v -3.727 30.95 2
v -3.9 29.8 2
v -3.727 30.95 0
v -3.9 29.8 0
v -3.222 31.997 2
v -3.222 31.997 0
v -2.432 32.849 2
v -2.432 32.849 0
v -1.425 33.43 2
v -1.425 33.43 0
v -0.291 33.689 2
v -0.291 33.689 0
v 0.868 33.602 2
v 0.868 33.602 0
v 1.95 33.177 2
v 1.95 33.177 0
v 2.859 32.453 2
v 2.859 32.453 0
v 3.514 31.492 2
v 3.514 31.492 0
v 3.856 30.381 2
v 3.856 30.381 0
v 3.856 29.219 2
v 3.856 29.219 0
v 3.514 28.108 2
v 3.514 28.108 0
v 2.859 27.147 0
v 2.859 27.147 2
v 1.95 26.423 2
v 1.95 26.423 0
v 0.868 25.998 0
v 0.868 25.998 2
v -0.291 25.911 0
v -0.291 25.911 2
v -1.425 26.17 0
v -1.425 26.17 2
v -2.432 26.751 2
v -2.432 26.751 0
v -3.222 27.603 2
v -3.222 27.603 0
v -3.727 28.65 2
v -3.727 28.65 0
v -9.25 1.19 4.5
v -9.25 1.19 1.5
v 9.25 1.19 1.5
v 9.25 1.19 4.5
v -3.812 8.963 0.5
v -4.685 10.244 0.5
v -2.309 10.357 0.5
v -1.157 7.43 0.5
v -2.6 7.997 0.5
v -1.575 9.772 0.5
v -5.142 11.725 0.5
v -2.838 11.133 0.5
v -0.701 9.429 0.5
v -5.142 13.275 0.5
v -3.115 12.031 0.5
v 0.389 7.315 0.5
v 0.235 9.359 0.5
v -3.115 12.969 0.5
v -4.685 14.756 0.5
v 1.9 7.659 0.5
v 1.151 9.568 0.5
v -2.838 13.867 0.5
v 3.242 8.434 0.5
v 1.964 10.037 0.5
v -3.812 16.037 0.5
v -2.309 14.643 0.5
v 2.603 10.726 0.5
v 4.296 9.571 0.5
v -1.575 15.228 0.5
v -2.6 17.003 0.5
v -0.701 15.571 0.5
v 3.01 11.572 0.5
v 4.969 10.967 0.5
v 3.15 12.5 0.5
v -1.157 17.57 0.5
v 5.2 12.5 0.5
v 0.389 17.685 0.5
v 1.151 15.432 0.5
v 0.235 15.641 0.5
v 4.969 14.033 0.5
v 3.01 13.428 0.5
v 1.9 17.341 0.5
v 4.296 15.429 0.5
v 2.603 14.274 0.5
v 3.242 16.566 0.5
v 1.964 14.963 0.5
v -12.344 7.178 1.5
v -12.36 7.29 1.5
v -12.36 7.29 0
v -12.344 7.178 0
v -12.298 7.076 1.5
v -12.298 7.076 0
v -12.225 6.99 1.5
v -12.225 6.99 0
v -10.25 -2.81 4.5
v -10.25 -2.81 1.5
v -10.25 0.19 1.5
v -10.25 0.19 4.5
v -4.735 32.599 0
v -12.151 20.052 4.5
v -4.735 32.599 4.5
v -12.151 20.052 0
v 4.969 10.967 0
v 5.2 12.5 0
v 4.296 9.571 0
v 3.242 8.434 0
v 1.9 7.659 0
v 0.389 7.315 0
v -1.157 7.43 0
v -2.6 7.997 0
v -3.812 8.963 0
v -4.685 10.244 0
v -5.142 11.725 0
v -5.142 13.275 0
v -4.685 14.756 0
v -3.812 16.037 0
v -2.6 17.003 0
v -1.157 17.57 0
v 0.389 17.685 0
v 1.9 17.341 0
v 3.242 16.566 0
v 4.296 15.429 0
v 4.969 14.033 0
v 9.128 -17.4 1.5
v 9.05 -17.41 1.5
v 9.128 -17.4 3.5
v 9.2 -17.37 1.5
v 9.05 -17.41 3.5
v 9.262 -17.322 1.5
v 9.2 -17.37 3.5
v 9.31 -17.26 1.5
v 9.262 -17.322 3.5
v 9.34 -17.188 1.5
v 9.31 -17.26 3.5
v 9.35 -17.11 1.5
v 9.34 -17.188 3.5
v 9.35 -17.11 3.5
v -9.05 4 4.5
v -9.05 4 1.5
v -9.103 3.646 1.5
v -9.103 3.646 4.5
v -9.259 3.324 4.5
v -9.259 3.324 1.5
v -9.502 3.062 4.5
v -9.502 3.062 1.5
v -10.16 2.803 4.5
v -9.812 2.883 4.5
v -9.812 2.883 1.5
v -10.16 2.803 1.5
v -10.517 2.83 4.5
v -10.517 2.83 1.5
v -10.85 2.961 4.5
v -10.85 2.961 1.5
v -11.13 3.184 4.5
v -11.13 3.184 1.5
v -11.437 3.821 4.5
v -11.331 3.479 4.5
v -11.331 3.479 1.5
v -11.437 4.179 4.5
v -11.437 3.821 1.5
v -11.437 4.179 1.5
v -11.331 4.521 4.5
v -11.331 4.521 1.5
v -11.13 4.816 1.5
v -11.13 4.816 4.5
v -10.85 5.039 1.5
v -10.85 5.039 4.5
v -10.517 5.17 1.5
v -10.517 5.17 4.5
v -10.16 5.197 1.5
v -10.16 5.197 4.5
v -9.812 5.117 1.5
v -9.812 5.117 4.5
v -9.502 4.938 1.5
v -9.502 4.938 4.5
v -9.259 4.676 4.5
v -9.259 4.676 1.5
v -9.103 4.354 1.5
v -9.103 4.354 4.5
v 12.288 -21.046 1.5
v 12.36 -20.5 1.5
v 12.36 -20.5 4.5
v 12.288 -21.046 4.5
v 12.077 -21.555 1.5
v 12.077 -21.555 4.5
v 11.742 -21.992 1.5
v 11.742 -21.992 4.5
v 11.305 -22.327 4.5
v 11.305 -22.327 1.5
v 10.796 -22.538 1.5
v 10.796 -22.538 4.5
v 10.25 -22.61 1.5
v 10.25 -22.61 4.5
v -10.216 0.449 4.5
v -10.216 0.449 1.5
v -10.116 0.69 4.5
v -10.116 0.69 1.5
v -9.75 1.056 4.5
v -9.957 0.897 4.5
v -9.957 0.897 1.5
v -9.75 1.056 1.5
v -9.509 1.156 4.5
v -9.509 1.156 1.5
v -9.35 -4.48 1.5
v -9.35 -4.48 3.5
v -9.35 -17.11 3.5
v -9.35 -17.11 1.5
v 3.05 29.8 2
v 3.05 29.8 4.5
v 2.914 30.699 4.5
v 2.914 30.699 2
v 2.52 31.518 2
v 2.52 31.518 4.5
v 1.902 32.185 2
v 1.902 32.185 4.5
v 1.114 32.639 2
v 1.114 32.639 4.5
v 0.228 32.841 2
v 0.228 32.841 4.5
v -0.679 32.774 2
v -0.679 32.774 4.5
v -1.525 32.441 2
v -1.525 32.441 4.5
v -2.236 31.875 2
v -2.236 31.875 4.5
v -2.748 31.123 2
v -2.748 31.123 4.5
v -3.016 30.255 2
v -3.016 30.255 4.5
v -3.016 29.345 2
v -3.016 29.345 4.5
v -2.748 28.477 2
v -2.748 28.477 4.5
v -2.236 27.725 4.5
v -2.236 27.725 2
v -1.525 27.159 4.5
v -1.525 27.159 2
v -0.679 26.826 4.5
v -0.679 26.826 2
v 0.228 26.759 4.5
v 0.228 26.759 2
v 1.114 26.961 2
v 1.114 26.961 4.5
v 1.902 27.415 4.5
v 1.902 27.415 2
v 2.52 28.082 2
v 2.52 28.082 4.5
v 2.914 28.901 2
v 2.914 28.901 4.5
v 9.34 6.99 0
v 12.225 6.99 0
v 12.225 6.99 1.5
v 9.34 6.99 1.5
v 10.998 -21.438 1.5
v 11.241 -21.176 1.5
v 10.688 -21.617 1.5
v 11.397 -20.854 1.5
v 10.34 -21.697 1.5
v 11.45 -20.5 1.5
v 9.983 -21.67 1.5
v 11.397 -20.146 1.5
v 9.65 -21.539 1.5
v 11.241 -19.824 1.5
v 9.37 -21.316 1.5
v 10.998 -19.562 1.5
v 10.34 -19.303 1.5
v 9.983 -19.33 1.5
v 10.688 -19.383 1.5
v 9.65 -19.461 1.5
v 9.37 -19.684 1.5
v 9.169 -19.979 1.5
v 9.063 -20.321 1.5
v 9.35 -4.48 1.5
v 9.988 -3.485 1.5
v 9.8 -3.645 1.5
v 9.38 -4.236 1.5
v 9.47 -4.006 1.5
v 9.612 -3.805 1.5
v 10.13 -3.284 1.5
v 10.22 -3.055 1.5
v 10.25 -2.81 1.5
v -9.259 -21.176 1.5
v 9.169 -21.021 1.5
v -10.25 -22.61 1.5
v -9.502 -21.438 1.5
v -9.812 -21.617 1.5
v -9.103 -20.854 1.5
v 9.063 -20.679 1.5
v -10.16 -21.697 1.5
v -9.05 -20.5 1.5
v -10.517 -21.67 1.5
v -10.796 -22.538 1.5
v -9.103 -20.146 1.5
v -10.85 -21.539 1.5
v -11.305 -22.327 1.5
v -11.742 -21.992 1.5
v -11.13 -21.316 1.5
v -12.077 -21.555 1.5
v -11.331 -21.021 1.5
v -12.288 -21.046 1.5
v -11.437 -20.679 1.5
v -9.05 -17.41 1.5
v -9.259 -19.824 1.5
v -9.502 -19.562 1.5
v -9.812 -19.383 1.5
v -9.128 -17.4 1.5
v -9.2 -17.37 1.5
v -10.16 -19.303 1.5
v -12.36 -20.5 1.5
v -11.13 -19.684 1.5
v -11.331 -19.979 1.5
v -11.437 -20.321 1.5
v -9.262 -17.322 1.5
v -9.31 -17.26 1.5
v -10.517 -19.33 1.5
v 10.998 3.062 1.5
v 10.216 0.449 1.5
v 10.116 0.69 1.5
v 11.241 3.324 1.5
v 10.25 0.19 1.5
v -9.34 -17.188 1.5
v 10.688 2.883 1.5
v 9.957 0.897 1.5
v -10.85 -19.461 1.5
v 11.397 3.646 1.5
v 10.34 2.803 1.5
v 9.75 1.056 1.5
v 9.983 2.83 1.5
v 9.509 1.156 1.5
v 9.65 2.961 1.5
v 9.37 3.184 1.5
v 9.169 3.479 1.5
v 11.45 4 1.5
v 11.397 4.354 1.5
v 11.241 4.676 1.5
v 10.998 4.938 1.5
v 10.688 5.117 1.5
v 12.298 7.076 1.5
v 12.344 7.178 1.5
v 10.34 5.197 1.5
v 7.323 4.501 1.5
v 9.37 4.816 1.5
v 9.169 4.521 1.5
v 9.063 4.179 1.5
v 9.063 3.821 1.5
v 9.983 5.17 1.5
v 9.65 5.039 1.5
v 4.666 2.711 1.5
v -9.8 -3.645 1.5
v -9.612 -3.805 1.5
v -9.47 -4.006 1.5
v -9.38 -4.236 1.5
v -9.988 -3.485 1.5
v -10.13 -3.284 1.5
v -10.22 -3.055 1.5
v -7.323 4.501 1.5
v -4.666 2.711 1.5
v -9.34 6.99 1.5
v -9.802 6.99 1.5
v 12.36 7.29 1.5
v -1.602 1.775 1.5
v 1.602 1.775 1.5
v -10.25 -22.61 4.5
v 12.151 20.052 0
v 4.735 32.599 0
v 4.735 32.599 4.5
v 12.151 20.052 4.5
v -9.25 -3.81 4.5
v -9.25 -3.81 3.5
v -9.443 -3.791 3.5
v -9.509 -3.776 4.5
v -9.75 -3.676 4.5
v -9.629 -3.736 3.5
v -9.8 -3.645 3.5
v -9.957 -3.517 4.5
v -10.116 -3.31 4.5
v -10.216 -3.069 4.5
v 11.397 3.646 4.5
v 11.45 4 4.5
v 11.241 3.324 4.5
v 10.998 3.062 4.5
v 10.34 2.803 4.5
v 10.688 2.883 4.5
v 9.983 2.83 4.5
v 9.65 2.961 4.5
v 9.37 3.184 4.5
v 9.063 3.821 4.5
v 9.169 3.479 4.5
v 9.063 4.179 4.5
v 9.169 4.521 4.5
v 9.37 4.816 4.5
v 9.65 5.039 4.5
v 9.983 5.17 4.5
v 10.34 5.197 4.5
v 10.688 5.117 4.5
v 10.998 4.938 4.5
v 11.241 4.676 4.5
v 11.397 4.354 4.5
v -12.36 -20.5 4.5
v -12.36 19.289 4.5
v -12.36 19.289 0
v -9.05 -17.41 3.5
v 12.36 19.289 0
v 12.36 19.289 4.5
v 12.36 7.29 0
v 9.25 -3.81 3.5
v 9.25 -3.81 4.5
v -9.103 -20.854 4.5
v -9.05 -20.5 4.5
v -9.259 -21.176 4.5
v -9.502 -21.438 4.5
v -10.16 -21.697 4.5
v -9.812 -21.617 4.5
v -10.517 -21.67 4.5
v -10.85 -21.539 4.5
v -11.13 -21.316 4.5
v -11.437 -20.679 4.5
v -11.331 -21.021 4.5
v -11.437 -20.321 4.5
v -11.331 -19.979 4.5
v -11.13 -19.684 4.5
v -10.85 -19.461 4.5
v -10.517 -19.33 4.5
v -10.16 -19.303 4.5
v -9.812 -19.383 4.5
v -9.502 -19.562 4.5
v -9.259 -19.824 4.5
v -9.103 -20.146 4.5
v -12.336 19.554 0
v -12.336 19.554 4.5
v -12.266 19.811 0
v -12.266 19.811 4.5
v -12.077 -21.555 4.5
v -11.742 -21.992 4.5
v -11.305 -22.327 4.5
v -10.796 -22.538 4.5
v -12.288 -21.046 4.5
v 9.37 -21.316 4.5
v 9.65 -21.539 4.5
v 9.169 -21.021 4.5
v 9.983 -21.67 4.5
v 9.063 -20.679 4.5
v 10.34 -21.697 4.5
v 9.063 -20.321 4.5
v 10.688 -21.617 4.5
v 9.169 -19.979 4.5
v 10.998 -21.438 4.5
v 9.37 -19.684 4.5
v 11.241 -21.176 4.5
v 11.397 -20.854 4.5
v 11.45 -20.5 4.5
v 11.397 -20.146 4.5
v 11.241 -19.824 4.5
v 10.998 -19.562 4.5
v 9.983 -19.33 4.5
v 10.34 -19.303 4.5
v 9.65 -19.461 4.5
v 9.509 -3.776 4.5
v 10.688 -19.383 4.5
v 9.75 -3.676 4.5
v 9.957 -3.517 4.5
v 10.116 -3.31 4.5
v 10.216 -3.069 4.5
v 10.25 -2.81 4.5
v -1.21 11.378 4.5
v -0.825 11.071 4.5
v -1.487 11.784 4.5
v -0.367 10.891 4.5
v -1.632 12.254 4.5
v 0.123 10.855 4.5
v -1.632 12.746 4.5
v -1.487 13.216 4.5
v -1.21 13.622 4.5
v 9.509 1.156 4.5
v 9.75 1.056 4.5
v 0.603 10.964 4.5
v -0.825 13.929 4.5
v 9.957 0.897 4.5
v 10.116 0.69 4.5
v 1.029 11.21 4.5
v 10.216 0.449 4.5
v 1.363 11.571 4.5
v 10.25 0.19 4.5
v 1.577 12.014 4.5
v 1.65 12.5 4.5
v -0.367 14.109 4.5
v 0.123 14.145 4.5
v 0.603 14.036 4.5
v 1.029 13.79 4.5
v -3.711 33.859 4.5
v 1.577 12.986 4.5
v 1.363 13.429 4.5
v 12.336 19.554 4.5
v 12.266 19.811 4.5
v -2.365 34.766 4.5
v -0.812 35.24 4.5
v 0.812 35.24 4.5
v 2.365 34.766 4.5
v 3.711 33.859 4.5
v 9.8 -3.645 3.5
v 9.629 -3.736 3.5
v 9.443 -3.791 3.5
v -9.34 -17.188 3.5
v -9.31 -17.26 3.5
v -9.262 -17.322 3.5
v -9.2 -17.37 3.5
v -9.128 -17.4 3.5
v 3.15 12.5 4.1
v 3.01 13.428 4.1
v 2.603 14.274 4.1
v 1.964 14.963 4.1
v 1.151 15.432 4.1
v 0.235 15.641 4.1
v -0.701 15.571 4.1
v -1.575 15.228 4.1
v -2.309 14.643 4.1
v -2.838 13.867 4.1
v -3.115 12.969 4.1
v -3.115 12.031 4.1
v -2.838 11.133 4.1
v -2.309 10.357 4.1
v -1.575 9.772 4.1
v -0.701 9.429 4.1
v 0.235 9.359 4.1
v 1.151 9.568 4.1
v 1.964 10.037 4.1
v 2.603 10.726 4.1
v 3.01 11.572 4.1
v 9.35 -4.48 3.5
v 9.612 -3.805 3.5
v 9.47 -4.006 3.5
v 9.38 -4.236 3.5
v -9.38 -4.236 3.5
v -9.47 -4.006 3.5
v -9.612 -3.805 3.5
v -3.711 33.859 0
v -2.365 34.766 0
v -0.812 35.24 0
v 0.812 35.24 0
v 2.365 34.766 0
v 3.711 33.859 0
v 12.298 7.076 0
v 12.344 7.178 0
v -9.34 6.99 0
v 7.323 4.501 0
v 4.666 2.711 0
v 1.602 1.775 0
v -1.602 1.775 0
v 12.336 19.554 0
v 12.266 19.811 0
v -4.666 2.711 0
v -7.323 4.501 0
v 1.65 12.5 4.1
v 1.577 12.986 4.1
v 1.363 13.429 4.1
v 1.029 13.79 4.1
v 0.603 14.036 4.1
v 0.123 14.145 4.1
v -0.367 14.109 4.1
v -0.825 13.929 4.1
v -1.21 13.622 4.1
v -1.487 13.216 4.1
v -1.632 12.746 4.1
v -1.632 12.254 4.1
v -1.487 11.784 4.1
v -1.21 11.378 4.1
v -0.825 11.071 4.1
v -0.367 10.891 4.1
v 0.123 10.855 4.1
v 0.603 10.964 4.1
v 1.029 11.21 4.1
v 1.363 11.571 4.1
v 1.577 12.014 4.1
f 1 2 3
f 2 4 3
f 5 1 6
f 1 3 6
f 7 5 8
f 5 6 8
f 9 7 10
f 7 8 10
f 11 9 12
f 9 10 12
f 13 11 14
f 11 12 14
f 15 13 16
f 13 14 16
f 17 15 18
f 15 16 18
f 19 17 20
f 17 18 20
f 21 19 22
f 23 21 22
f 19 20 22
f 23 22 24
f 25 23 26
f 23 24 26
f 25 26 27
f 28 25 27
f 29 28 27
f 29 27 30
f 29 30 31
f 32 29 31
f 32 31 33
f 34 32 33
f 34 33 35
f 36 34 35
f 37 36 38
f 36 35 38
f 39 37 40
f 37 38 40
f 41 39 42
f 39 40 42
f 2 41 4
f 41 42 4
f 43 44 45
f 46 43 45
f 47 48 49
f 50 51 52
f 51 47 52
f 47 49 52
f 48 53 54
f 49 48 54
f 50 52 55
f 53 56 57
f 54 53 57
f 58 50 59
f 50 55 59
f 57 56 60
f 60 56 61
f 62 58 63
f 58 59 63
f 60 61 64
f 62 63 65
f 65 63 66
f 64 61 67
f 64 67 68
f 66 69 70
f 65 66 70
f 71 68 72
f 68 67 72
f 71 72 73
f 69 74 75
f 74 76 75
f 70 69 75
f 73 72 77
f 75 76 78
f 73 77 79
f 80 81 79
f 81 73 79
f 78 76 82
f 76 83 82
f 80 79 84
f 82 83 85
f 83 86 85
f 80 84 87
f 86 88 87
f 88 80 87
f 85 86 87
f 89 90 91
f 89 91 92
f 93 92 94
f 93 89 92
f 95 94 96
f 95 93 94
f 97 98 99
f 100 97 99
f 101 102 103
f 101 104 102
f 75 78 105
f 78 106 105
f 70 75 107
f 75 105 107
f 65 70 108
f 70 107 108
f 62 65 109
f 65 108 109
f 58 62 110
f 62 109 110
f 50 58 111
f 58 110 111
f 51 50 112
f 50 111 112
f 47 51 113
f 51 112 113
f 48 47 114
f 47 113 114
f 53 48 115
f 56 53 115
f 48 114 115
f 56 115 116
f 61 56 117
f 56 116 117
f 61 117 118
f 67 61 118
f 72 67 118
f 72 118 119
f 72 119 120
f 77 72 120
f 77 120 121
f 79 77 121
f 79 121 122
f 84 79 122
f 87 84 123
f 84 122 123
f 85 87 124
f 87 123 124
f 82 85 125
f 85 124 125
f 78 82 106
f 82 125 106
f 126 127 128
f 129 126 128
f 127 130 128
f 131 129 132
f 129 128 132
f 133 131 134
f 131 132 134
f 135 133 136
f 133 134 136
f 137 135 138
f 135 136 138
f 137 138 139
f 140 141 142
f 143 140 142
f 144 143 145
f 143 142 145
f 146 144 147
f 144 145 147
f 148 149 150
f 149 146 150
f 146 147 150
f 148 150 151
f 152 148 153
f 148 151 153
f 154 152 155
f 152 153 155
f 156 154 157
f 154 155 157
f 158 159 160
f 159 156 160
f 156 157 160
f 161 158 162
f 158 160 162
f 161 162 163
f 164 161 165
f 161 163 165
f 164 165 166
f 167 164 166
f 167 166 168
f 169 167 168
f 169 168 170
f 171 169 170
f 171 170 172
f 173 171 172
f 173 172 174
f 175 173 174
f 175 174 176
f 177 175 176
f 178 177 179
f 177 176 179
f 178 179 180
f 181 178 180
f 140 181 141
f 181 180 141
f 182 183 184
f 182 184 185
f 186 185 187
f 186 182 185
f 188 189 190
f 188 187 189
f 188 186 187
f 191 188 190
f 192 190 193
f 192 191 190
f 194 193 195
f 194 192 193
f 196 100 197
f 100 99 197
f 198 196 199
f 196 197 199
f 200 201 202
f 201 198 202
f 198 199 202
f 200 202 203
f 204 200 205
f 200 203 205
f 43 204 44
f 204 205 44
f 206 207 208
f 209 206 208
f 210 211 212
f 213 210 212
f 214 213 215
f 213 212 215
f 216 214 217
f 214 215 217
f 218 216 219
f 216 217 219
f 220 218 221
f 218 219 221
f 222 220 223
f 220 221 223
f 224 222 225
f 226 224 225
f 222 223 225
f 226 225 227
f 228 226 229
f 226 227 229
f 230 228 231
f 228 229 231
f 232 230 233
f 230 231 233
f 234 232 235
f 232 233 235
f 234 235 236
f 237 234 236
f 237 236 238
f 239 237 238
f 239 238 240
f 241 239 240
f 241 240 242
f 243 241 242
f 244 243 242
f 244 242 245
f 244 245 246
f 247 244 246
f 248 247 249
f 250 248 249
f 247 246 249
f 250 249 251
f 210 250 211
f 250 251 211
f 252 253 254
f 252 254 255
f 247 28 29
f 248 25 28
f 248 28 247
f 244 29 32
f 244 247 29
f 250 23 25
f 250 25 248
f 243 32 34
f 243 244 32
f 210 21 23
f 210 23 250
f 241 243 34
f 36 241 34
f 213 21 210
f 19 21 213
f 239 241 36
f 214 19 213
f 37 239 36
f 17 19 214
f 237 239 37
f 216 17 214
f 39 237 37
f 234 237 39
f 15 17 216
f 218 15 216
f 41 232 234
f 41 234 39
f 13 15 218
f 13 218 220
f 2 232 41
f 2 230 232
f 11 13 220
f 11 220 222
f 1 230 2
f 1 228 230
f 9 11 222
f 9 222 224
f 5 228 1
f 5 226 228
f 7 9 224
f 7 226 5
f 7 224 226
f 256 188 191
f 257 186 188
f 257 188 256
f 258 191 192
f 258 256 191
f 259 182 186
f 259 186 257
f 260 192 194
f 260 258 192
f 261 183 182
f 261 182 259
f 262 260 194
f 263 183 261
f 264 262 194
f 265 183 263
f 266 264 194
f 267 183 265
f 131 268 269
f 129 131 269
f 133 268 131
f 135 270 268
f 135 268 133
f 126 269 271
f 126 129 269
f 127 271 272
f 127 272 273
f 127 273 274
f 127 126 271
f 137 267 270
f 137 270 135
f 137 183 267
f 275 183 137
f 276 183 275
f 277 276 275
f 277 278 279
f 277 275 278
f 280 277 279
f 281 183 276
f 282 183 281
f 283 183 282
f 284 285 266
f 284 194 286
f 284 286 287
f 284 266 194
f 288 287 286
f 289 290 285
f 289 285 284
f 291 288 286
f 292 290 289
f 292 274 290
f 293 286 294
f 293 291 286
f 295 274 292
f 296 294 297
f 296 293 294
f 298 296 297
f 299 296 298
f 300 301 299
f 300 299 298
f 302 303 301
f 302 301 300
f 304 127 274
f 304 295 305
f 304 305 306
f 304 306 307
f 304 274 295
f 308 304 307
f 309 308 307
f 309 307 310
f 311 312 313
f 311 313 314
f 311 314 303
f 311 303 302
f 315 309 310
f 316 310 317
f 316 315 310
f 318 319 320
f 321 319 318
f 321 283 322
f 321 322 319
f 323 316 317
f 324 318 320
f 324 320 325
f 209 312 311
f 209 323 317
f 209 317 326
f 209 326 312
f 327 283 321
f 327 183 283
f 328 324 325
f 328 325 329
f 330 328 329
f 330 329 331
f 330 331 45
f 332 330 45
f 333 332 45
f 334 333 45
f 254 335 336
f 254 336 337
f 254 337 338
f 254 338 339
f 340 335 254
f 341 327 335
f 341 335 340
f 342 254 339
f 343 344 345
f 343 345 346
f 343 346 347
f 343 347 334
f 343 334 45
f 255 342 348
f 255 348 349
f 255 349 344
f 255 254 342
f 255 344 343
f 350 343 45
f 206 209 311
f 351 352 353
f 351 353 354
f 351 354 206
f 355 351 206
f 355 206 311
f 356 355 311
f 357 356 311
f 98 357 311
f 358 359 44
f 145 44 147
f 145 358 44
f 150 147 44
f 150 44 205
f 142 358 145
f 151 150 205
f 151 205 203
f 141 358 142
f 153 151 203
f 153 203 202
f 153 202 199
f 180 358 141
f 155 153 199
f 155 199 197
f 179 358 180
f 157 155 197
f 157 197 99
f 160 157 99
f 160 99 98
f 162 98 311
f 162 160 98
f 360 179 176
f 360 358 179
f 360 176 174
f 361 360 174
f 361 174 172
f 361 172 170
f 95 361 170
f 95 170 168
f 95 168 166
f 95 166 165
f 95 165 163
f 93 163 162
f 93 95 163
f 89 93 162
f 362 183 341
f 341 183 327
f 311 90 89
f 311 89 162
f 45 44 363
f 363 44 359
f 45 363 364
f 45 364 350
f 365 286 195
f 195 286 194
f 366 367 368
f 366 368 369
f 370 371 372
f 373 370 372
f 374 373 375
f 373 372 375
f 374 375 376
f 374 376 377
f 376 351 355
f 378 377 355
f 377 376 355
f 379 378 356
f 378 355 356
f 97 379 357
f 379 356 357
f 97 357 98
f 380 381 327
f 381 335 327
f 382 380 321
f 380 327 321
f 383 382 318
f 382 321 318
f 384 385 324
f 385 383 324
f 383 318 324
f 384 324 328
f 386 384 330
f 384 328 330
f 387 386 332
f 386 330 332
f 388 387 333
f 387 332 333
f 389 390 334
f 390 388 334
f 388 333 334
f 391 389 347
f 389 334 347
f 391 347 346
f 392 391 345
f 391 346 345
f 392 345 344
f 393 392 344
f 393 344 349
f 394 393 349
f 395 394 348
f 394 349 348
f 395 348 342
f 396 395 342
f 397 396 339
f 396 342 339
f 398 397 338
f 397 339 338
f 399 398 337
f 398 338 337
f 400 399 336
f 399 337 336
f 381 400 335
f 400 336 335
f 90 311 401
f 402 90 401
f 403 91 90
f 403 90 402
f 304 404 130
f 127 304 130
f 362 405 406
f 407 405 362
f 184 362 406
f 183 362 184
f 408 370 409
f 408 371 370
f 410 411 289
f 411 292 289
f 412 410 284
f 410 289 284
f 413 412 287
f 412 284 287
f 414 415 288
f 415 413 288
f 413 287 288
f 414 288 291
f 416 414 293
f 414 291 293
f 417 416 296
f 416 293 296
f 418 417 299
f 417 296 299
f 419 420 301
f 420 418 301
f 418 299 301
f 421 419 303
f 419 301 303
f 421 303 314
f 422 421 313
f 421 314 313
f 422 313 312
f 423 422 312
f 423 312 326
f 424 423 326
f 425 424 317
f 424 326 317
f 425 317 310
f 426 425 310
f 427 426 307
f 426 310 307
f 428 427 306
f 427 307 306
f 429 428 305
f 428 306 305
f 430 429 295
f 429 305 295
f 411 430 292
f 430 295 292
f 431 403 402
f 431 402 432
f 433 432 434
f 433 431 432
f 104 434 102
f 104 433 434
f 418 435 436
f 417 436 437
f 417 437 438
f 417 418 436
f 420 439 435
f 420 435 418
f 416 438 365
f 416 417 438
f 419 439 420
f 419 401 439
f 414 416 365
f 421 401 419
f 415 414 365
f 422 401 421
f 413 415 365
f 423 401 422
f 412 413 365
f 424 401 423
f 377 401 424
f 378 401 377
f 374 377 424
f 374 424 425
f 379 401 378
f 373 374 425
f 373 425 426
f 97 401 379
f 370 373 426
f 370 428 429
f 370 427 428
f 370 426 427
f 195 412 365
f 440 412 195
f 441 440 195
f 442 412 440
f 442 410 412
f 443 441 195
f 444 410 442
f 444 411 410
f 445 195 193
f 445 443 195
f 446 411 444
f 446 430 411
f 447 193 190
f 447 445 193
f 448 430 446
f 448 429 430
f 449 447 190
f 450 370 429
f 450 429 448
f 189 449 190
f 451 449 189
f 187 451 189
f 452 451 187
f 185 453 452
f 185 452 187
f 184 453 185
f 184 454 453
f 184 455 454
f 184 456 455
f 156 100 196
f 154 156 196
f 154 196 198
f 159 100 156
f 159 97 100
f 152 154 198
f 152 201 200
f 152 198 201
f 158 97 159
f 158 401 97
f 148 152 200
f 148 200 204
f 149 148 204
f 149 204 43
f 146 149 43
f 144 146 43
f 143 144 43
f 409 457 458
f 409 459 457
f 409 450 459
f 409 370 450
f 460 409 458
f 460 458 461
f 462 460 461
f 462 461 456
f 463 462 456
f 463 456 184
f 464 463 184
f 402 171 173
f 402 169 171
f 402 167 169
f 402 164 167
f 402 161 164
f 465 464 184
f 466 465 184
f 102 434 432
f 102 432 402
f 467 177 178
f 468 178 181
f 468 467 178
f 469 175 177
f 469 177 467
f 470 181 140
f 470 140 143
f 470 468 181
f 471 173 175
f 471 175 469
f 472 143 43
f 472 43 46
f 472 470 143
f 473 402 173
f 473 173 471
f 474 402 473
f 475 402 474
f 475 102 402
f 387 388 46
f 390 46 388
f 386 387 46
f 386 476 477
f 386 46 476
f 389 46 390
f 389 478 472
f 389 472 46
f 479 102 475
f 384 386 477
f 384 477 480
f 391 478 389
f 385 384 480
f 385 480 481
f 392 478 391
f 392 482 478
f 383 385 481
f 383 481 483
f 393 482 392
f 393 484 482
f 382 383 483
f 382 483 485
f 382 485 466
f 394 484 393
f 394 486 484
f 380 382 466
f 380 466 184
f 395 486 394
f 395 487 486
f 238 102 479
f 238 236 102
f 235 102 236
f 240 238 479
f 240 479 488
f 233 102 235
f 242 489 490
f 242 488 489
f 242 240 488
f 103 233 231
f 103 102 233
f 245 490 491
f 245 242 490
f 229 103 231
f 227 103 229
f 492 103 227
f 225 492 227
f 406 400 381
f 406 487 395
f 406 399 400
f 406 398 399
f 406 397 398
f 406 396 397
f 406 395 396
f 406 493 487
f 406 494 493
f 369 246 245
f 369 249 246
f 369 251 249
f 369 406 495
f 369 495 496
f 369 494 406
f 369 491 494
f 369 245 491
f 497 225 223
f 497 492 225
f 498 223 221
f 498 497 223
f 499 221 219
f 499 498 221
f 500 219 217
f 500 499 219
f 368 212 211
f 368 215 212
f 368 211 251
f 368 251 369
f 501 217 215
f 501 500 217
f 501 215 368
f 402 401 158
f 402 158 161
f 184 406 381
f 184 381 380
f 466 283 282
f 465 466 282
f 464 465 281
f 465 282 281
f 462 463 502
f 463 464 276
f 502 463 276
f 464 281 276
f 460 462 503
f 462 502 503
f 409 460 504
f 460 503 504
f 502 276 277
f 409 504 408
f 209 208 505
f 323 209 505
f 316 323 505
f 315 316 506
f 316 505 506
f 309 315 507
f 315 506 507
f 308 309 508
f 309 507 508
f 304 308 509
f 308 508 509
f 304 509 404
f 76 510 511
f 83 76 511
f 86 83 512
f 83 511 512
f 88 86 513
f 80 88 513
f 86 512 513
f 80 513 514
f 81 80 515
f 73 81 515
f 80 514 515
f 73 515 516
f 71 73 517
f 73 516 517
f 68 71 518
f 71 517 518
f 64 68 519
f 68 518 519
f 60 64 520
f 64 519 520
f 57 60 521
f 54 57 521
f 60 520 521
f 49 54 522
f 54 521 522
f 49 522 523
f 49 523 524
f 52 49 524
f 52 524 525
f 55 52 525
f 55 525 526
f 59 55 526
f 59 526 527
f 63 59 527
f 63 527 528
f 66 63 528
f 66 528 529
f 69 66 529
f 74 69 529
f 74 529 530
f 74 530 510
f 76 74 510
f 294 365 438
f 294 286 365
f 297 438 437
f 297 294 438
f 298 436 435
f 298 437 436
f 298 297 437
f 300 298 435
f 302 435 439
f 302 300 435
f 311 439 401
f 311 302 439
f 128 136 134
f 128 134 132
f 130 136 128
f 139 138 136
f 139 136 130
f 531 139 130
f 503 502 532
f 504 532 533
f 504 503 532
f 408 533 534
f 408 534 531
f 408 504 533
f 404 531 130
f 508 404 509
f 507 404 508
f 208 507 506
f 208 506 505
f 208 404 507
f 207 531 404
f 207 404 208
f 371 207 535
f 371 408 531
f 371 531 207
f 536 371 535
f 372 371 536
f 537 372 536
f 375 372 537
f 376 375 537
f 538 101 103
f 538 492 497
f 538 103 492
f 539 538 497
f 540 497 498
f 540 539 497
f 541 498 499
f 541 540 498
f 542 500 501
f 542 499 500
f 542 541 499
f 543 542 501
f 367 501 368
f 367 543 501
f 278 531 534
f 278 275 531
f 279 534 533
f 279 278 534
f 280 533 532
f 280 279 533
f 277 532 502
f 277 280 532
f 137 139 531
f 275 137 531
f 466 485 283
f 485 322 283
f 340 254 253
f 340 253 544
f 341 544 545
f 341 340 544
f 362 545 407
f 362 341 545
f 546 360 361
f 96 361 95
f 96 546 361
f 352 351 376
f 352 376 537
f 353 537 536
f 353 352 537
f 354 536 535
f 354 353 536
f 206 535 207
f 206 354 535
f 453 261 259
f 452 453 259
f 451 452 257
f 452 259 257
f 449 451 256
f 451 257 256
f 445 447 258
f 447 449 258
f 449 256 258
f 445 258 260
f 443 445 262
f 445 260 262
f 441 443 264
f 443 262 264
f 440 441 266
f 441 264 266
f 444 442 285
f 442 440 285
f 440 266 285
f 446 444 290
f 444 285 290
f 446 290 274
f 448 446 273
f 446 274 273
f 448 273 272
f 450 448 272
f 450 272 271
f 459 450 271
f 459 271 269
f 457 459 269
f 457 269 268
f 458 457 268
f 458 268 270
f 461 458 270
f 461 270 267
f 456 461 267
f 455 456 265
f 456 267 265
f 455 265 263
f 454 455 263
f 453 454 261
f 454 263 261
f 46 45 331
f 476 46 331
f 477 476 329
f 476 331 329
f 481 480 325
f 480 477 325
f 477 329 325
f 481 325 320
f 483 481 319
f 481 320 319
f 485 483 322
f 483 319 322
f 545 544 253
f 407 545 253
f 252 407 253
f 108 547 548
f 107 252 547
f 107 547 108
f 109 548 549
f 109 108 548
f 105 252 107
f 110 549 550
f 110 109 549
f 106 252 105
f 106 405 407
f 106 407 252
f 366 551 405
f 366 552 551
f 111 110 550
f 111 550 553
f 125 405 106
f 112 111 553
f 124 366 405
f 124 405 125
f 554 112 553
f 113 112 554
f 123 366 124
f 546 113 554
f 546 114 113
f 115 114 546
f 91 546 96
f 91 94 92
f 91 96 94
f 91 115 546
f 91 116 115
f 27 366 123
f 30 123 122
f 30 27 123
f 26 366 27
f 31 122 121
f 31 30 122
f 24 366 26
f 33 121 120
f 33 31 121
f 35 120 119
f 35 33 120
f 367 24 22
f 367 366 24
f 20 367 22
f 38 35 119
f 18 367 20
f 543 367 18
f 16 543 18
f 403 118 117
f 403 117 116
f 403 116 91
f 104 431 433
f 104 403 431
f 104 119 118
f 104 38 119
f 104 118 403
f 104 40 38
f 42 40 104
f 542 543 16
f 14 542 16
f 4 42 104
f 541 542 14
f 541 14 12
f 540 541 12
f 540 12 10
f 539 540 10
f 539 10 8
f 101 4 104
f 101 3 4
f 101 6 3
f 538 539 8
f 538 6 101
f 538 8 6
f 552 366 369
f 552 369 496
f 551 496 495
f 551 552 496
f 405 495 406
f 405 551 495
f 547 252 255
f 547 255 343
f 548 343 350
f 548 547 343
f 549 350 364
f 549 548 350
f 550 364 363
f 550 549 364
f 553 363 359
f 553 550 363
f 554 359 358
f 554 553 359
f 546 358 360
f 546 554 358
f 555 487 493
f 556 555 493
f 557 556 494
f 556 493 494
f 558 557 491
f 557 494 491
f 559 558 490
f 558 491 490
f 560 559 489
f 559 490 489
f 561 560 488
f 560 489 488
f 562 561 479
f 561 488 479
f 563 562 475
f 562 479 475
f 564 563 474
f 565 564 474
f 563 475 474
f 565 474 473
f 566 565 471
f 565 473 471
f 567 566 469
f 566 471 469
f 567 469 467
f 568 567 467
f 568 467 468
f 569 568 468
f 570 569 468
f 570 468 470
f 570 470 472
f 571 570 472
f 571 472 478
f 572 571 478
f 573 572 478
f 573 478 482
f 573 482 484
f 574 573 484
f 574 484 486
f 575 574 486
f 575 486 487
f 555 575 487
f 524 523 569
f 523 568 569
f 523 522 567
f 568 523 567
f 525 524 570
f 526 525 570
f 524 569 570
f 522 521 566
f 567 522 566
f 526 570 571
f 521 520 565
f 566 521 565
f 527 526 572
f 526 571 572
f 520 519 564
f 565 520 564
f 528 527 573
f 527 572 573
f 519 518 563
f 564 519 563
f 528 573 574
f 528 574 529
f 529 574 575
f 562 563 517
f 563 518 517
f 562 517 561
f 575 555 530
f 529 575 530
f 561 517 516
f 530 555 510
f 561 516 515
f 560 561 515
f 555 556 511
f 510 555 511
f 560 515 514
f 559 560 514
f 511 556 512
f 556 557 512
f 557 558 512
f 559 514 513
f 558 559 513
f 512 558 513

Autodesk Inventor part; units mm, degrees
ref_plane "YZ Plane" through (0, 0, 0) normal (1, 0, 0) x (0, 1, 0)
ref_plane "XZ Plane" through (0, 0, 0) normal (0, 1, 0) x (-1, 0, 0)
ref_plane "XY Plane" through (0, 0, 0) normal (0, 0, 1) x (1, 0, 0)
sketch "スケッチ1" plane through (0, 0, 0) normal (0, 0, 1) x (1, 0, 0)
  circle A0 centre (0, 12.5) radius 5 construction
  line L0 (12.16, 19.2887) -> (12.16, 6.89) construction
  arc A1 (12.16, 19.2887) -> (11.7792, 20.2079) centre (10.86, 19.2887) ccw construction
  line L1 (9.9579, 22.0292) -> (11.7792, 20.2079) construction
  arc A2 (9.9579, 22.0292) -> (9.0387, 22.41) centre (9.0387, 21.11) ccw construction
  line L2 (0.95, 22.41) -> (9.0387, 22.41) construction
  line L3 (0.95, 19.61) -> (0.95, 22.41) construction
  arc A3 (-0.95, 19.61) -> (0.95, 19.61) centre (0, 19.61) ccw construction
  line L4 (-0.95, 22.41) -> (-0.95, 19.61) construction
  line L5 (-9.0387, 22.41) -> (-0.95, 22.41) construction
  arc A4 (-9.0387, 22.41) -> (-9.9579, 22.0292) centre (-9.0387, 21.11) ccw construction
  line L6 (-11.7792, 20.2079) -> (-9.9579, 22.0292) construction
  arc A5 (-11.7792, 20.2079) -> (-12.16, 19.2887) centre (-10.86, 19.2887) ccw construction
  line L7 (-12.16, 6.89) -> (-12.16, 19.2887) construction
  line L8 (-12.16, 6.89) -> (-9.9756, 6.89) construction
  arc A6 (-9.8028, 6.7907) -> (-9.9756, 6.89) centre (-9.9756, 6.69) ccw construction
  arc A7 (-9.8028, 6.7907) -> (-6.5643, 3.2479) centre (0, 12.5) ccw construction
  arc A8 (-6.48, 3.0847) -> (-6.5643, 3.2479) centre (-6.68, 3.0847) ccw construction
  line L9 (-6.48, 3.0847) -> (-6.48, 1.39) construction
  arc A9 (-6.68, 1.19) -> (-6.48, 1.39) centre (-6.68, 1.39) ccw construction
  line L10 (-6.68, 1.19) -> (6.68, 1.19) projected
  arc A10 (6.48, 1.39) -> (6.68, 1.19) centre (6.68, 1.39) ccw construction
  line L11 (6.48, 1.39) -> (6.48, 3.0847) construction
  arc A11 (6.5643, 3.2479) -> (6.48, 3.0847) centre (6.68, 3.0847) ccw construction
  arc A12 (6.5643, 3.2479) -> (9.8028, 6.7907) centre (0, 12.5) ccw construction
  arc A13 (9.9756, 6.89) -> (9.8028, 6.7907) centre (9.9756, 6.69) ccw construction
  line L12 (9.9756, 6.89) -> (12.16, 6.89) construction
  arc A14 (12.36, 19.2887) -> (12.1513, 20.052) centre (10.86, 19.2887) ccw projected
  arc A15 (-12.1513, 20.052) -> (-12.36, 19.2887) centre (-10.86, 19.2887) ccw projected
  line L13 (12.36, 19.2887) -> (12.36, -20.5) projected
  line L14 (-12.36, -20.5) -> (-12.36, 19.2887) projected
  line L15 (-12.36, 6.89) -> (-9.86, 6.89)
  line L16 (12.36, 6.89) -> (9.86, 6.89)
  arc A16 (-9.86, 6.89) -> (9.86, 6.89) centre (0, 12.5) ccw
  circle A17 centre (0, 12.5) radius 5.2
  arc A18 (4.7347, 32.5987) -> (-4.7347, 32.5987) centre (0, 29.8) ccw projected
  line L17 (-12.1513, 20.052) -> (-4.7347, 32.5987) projected
  circle A19 centre (0, 29.8) radius 1.5
  line L18 (4.7347, 32.5987) -> (12.1513, 20.052) projected
  circle A20 centre (0, 29.8) radius 1.5 construction
  point P0 (0, 0)
  point P1 (-11.1384, 22.2293)
  point P2 (11.1384, 22.2293)
  point P3 (-0.8807, 1.19)
  point P4 (0.8807, 1.19)
  dimension "d0" = 10.4
extrude "押し出し1" add sketch "スケッチ1" along normal blind 1.5 contours A16 L15 L14 A15 L17 A18 L18 A14 L13 L16 L10
sketch "スケッチ2" plane through (0, 0, 1.5) normal (0, 0, 1) x (1, 0, 0)
  arc A0 (-9.86, 6.89) -> (-0.8807, 1.19) centre (0, 12.5) ccw projected
  line L0 (9.1914, -4.7213) -> (9.25, -4.7213) projected
  ellipse E0 centre (9.05, -4.9213) end of major axis (9.05, -4.6384) minor radius 0.2 (9.25, -4.9213) -> (9.1914, -4.7213) ccw projected
  line L1 (9.25, -4.9213) -> (9.25, -17.11) projected
  arc A1 (9.05, -17.31) -> (9.25, -17.11) centre (9.05, -17.11) ccw projected
  line L2 (9.05, -17.31) -> (-9.05, -17.31) projected
  arc A2 (-9.25, -17.11) -> (-9.05, -17.31) centre (-9.05, -17.11) ccw projected
  line L3 (-9.25, -17.11) -> (-9.25, -4.9213) projected
  ellipse E1 centre (-9.05, -4.9213) end of major axis (-9.05, -5.2041) minor radius 0.2 (-9.1914, -4.7213) -> (-9.25, -4.9213) ccw projected
  line L4 (-9.25, -4.7213) -> (-9.1914, -4.7213) projected
  ellipse E2 centre (-9.25, -3.0242) end of major axis (-9.25, -4.7213) minor radius 1.2 (-10.45, -3.0242) -> (-9.25, -4.7213) ccw projected
  line L5 (-10.45, 0.19) -> (-10.45, -3.0242) projected
  arc A3 (-9.25, 1.39) -> (-10.45, 0.19) centre (-9.25, 0.19) ccw projected
  line L6 (-6.68, 1.39) -> (-9.25, 1.39) projected
  line L7 (-6.68, 3.0847) -> (-6.68, 1.39) projected
  arc A4 (-9.9756, 6.69) -> (-6.68, 3.0847) centre (0, 12.5) ccw construction
  line L8 (-12.16, 6.69) -> (-9.9756, 6.69) construction
  line L9 (-12.16, -20.5) -> (-12.16, 6.69) construction
  arc A5 (-12.16, -20.5) -> (-10.25, -22.41) centre (-10.25, -20.5) ccw construction
  line L10 (10.25, -22.41) -> (-10.25, -22.41) construction
  arc A6 (10.25, -22.41) -> (12.16, -20.5) centre (10.25, -20.5) ccw construction
  line L11 (12.16, 6.69) -> (12.16, -20.5) construction
  line L12 (9.9756, 6.69) -> (12.16, 6.69) construction
  arc A7 (6.68, 3.0847) -> (9.9756, 6.69) centre (0, 12.5) ccw construction
  line L13 (6.68, 1.39) -> (6.68, 3.0847) projected
  line L14 (9.25, 1.39) -> (6.68, 1.39) projected
  arc A8 (10.45, 0.19) -> (9.25, 1.39) centre (9.25, 0.19) ccw projected
  line L15 (10.45, -3.0242) -> (10.45, 0.19) projected
  ellipse E3 centre (9.25, -3.0242) end of major axis (9.25, -4.7213) minor radius 1.2 (9.25, -4.7213) -> (10.45, -3.0242) ccw projected
  circle A9 centre (10.25, 4) radius 0.7835 construction
  circle A10 centre (10.25, -20.5) radius 0.7835 construction
  circle A11 centre (-10.25, -20.5) radius 0.7835 construction
  circle A12 centre (-10.25, 4) radius 0.7835 construction
  arc A13 (-12.36, -20.5) -> (-10.25, -22.61) centre (-10.25, -20.5) ccw projected
  line L16 (-12.36, 6.69) -> (-12.36, -20.5) projected
  line L17 (-10.25, -22.61) -> (10.25, -22.61) projected
  arc A14 (10.25, -22.61) -> (12.36, -20.5) centre (10.25, -20.5) ccw projected
  line L18 (12.36, -20.5) -> (12.36, 6.69) projected
  line L19 (12.36, 6.69) -> (12.36, 19.2887) projected
  line L20 (-12.36, 19.2887) -> (-12.36, 6.69) projected
  circle A15 centre (-10.25, 4) radius 1.2
  circle A16 centre (-10.25, -20.5) radius 1.2
  circle A17 centre (10.25, -20.5) radius 1.2
  circle A18 centre (10.25, 4) radius 1.2
  line L21 (-6.68, 3.0847) -> (-6.68, 3.3311)
  line L22 (6.68, 3.0847) -> (6.68, 3.3311)
  line L23 (-6.68, 1.39) -> (6.68, 1.39)
  line L24 (9.86, 6.89) -> (12.36, 6.89) projected
  line L25 (12.36, 6.89) -> (12.36, 19.2887) projected
  arc A19 (12.36, 19.2887) -> (12.1513, 20.052) centre (10.86, 19.2887) ccw projected
  line L26 (12.1513, 20.052) -> (4.7347, 32.5987) projected
  arc A20 (4.7347, 32.5987) -> (-4.7347, 32.5987) centre (0, 29.8) ccw projected
  line L27 (-4.7347, 32.5987) -> (-12.1513, 20.052) projected
  arc A21 (-12.1513, 20.052) -> (-12.36, 19.2887) centre (-10.86, 19.2887) ccw projected
  line L28 (-12.36, 19.2887) -> (-12.36, 6.89) projected
  line L29 (-12.36, 6.89) -> (-9.86, 6.89) projected
  line L30 (-0.8807, 1.19) -> (0.8807, 1.19) projected
  arc A22 (0.8807, 1.19) -> (9.86, 6.89) centre (0, 12.5) ccw projected
  circle A23 centre (0, 12.5) radius 5.2 projected
  circle A24 centre (0, 29.8) radius 1.5 projected
  arc A25 (-10.25, -2.81) -> (-9.25, -3.81) centre (-9.25, -2.81) ccw projected
  line L31 (-10.25, -3.0242) -> (-10.25, 0.19) projected
  arc A26 (-9.25, 1.19) -> (-10.25, 0.19) centre (-9.25, 0.19) ccw projected
  line L32 (-9.25, 1.19) -> (-6.68, 1.19) projected
  line L33 (-6.68, 1.19) -> (6.68, 1.19) projected
  line L34 (6.68, 1.19) -> (9.25, 1.19) projected
  arc A27 (10.25, 0.19) -> (9.25, 1.19) centre (9.25, 0.19) ccw projected
  line L35 (10.25, 0.19) -> (10.25, -3.0242) projected
  arc A28 (9.25, -3.81) -> (10.25, -2.81) centre (9.25, -2.81) ccw projected
  line L36 (-9.25, -3.81) -> (9.25, -3.81) projected
  line L37 (-9.25, -4.9213) -> (-9.25, -3.81)
  line L38 (9.25, -4.9213) -> (9.25, -3.81)
  point P0 (0, 0)
  point P1 (12.36, 6.89)
  point P2 (-2.2934, 1.39)
  point P3 (2.2934, 1.39)
  point P4 (2.2934, 1.39)
  dimension "d3" = 2.4
extrude "押し出し2" add sketch "スケッチ2" along normal blind 2 contours L29 L20 A21 L27 A20 L26 A19 L19 L24 A22 L23 A0 | A0 L21 L7 L6 A3 L5 E2 L37 L3 A2 L2 A1 L1 L38 E3 L15 A8 L14 L13 L22 A22 L24 L19 L18 A14 L17 A13 L16 L20 L29 | A0 L23 L7 L21 | L23 A22 L30 A0 | A0 L33 L32 A26 L31 A25 L37 E2 L5 A3 L6 L23 | A22 L22 L13 L23 | L23 L14 A8 L15 E3 L38 A28 L35 A27 L34 L33 A22
sketch "スケッチ3" plane through (0, 0, 3.5) normal (0, 0, 1) x (1, 0, 0)
  line L0 (-12.36, 19.2887) -> (-12.36, -20.5) projected
  arc A0 (-12.36, -20.5) -> (-10.25, -22.61) centre (-10.25, -20.5) ccw projected
  line L1 (-10.25, -22.61) -> (10.25, -22.61) projected
  arc A1 (10.25, -22.61) -> (12.36, -20.5) centre (10.25, -20.5) ccw projected
  line L2 (12.36, -20.5) -> (12.36, 19.2887) projected
  arc A2 (12.36, 19.2887) -> (12.1513, 20.052) centre (10.86, 19.2887) ccw projected
  line L3 (12.1513, 20.052) -> (4.7347, 32.5987) projected
  arc A3 (4.7347, 32.5987) -> (-4.7347, 32.5987) centre (0, 29.8) ccw projected
  line L4 (-4.7347, 32.5987) -> (-12.1513, 20.052) projected
  arc A4 (-12.1513, 20.052) -> (-12.36, 19.2887) centre (-10.86, 19.2887) ccw projected
  line L5 (-9.25, -17.11) -> (-9.25, -3.81) projected
  arc A5 (-9.25, -17.11) -> (-9.05, -17.31) centre (-9.05, -17.11) ccw projected
  line L6 (9.05, -17.31) -> (-9.05, -17.31) projected
  arc A6 (9.05, -17.31) -> (9.25, -17.11) centre (9.05, -17.11) ccw projected
  circle A7 centre (-10.25, -20.5) radius 1.2 projected
  circle A8 centre (-10.25, 4) radius 1.2 projected
  circle A9 centre (10.25, 4) radius 1.2 projected
  circle A10 centre (10.25, -20.5) radius 1.2 projected
  line L7 (9.25, -3.81) -> (9.25, -17.11) projected
  arc A11 (-10.25, -2.81) -> (-9.25, -3.81) centre (-9.25, -2.81) ccw projected
  line L8 (-10.25, -2.81) -> (-10.25, 0.19) projected
  arc A12 (-9.25, 1.19) -> (-10.25, 0.19) centre (-9.25, 0.19) ccw projected
  line L9 (-9.25, 1.19) -> (9.25, 1.19) projected
  arc A13 (10.25, 0.19) -> (9.25, 1.19) centre (9.25, 0.19) ccw projected
  line L10 (10.25, 0.19) -> (10.25, -2.81) projected
  arc A14 (9.25, -3.81) -> (10.25, -2.81) centre (9.25, -2.81) ccw projected
  circle A15 centre (0, 29.8) radius 1.5 projected
  circle A16 centre (0, 12.5) radius 5.2 projected
  line L11 (-9.25, -3.81) -> (9.25, -3.81)
extrude "押し出し3" add sketch "スケッチ3" along normal blind 1 contours A4 L4 A3 L3 A2 L2 A1 L1 A0 L0 | L5 L11 L7 A6 L6 A5
sketch "スケッチ5" plane through (0, 0, 4.5) normal (0, 0, 1) x (1, 0, 0)
  circle A0 centre (0, 12.5) radius 5.2382
  circle A1 centre (0, 12.5) radius 3.15
  point P0 (0, 0)
  dimension "d11" = 6.3
extrude "押し出し5" add sketch "スケッチ5" against normal blind 4
sketch "スケッチ6" plane through (0, 0, 4.5) normal (0, 0, 1) x (1, 0, 0)
  circle A0 centre (0, 12.5) radius 3.15 projected
  circle A1 centre (0, 12.5) radius 1.65
  point P0 (0, 0)
  dimension "d14" = 3.3
extrude "押し出し6" add sketch "スケッチ6" against normal blind 0.4
fillet "フィレット1" radius 0.4 2 edges at (-12.36, 6.89, 0.75) (12.36, 6.89, 0.75)
sketch "スケッチ7" plane through (0, 0, 0) normal (0, 0, -1) x (-1, 0, 0)
  circle A0 centre (0, 29.8) radius 1.5 projected
  circle A1 centre (0, 29.8) radius 3.9
  point P0 (0, 0)
  dimension "d18" = 7.8
extrude "押し出し7" cut sketch "スケッチ7" against normal blind 2
sketch "スケッチ8" plane through (0, 0, 3.5) normal (0, 0, -1) x (-1, 0, 0)
  line L0 (-9.25, -3.81) -> (-9.25, -17.11) projected
  arc A0 (-9.25, -17.11) -> (-9.05, -17.31) centre (-9.05, -17.11) ccw projected
  line L1 (-9.05, -17.31) -> (9.05, -17.31) projected
  arc A1 (9.05, -17.31) -> (9.25, -17.11) centre (9.05, -17.11) ccw projected
  line L2 (9.25, -17.11) -> (9.25, -3.81) projected
  line L3 (-9.25, -3.81) -> (9.25, -3.81) projected
  line L4 (9.35, -3.71) -> (9.35, -17.11)
  arc A2 (9.05, -17.41) -> (9.35, -17.11) centre (9.05, -17.11) ccw
  line L5 (9.05, -17.41) -> (-9.05, -17.41)
  arc A3 (-9.35, -17.11) -> (-9.05, -17.41) centre (-9.05, -17.11) ccw
  line L6 (-9.35, -17.11) -> (-9.35, -3.71)
  line L7 (-9.35, -3.71) -> (9.35, -3.71)
  point P0 (0, 0)
  dimension "d21" = 0.1
extrude "押し出し8" cut sketch "スケッチ8" along normal through all
sketch "スケッチ10" plane through (0, 0, 1.5) normal (0, 0, -1) x (-1, 0, 0)
  line L0 (-9.35, -17.11) -> (-9.35, -3.805) projected
  arc A0 (-10.25, -2.81) -> (-9.35, -3.805) centre (-9.25, -2.81) ccw projected
  line L1 (-10.25, 0.19) -> (-10.25, -2.81) projected
  arc A1 (-9.25, 1.19) -> (-10.25, 0.19) centre (-9.25, 0.19) ccw projected
  arc A2 (-9.86, 6.89) -> (-0.8807, 1.19) centre (0, 12.5) ccw projected
  line L2 (-9.86, 6.89) -> (-11.96, 6.89) projected
  arc A3 (-12.36, 7.29) -> (-11.96, 6.89) centre (-11.96, 7.29) ccw projected
  line L3 (-12.36, -20.5) -> (-12.36, 7.29) projected
  arc A4 (-12.36, -20.5) -> (-10.25, -22.61) centre (-10.25, -20.5) ccw projected
  line L4 (10.25, -22.61) -> (-10.25, -22.61) projected
  arc A5 (10.25, -22.61) -> (12.36, -20.5) centre (10.25, -20.5) ccw projected
  line L5 (12.36, 7.29) -> (12.36, -20.5) projected
  arc A6 (11.96, 6.89) -> (12.36, 7.29) centre (11.96, 7.29) ccw projected
  line L6 (11.96, 6.89) -> (9.86, 6.89) projected
  arc A7 (0.8807, 1.19) -> (9.86, 6.89) centre (0, 12.5) ccw projected
  arc A8 (10.25, 0.19) -> (9.25, 1.19) centre (9.25, 0.19) ccw projected
  line L7 (10.25, -2.81) -> (10.25, 0.19) projected
  arc A9 (9.35, -3.805) -> (10.25, -2.81) centre (9.25, -2.81) ccw projected
  line L8 (9.35, -3.805) -> (9.35, -17.11) projected
  arc A10 (9.05, -17.41) -> (9.35, -17.11) centre (9.05, -17.11) ccw projected
  line L9 (9.05, -17.41) -> (-9.05, -17.41) projected
  arc A11 (-9.35, -17.11) -> (-9.05, -17.41) centre (-9.05, -17.11) ccw projected
  circle A12 centre (10.25, 4) radius 1.2 projected
  circle A13 centre (10.25, -20.5) radius 1.2 projected
  circle A14 centre (-10.25, -20.5) radius 1.2 projected
  circle A15 centre (-10.25, 4) radius 1.2 projected
  circle A16 centre (0, 12.5) radius 1.65 projected
  line L10 (0.8807, 1.19) -> (-0.8807, 1.19) projected
  arc A17 (-0.8807, 1.19) -> (0.8807, 1.19) centre (0, 12.5) ccw
  arc A18 (-9.8017, 6.99) -> (-0.8768, 1.29) centre (0, 12.5) ccw
  line L11 (-9.8017, 6.99) -> (-12.46, 6.99)
  line L12 (-12.46, 6.99) -> (-12.46, -20.5)
  arc A19 (-12.46, -20.5) -> (-10.25, -22.71) centre (-10.25, -20.5) ccw
  line L13 (-10.25, -22.71) -> (10.25, -22.71)
  arc A20 (10.25, -22.71) -> (12.46, -20.5) centre (10.25, -20.5) ccw
  line L14 (12.46, -20.5) -> (12.46, 6.99)
  line L15 (12.46, 6.99) -> (9.8017, 6.99)
  arc A21 (0.8768, 1.29) -> (9.8017, 6.99) centre (0, 12.5) ccw
  line L16 (0.8768, 1.29) -> (-0.8768, 1.29)
  point P0 (0, 0)
  point P1 (12.2246, 6.99)
  point P2 (-12.2246, 6.99)
  dimension "d24" = 0.1
extrude "押し出し9" cut sketch "スケッチ10" along normal through all
sketch "スケッチ11" plane through (0, 0, 0) normal (0, 0, -1) x (-1, 0, 0)
  line L0 (-0.8768, 1.29) -> (0.8768, 1.29) projected
  arc A0 (-9.8017, 6.99) -> (-0.8768, 1.29) centre (0, 12.5) ccw projected
  arc A1 (0.8768, 1.29) -> (9.8017, 6.99) centre (0, 12.5) ccw projected
  circle A2 centre (0, 12.5) radius 3.15 projected
  arc A3 (-0.8768, 1.29) -> (0.8768, 1.29) centre (0, 12.5) ccw
  point P0 (0, 0)
extrude "押し出し10" add sketch "スケッチ11" against normal up to surface (1.5 mm away) contours L0 A3
sketch "スケッチ15" plane through (0, 0, 0) normal (0, 0, -1) x (-1, 0, 0)
  arc A0 (-9.8017, 6.99) -> (9.8017, 6.99) centre (0, 12.5) ccw projected
  arc A1 (-9.3401, 6.99) -> (9.3401, 6.99) centre (0, 12.5) ccw
  line L0 (-9.8017, 6.99) -> (-9.3401, 6.99)
  line L1 (9.8017, 6.99) -> (12.2246, 6.99) projected
  line L2 (9.3401, 6.99) -> (9.8017, 6.99)
  point P0 (0, 0)
  dimension "d42" = 0.4
extrude "押し出し13" cut sketch "スケッチ15" against normal up to surface (1.5 mm away)
fillet "フィレット2" radius 1 2 edges at (9.35, -3.805, 2.5) (-9.35, -3.805, 2.5)
sketch "スケッチ16" plane through (0, 0, 4.5) normal (0, 0, 1) x (1, 0, 0)
  circle A0 centre (0, 29.8) radius 1.5 construction
  circle A1 centre (0, 29.8) radius 3.05
  point P0 (0, 0)
  dimension "d45" = 6.1
extrude "押し出し14" cut sketch "スケッチ16" against normal through all
sketch "スケッチ13" plane through (0, 0, 4.5) normal (0, 0, 1) x (1, 0, 0)
  circle A0 centre (0, 29.8) radius 1.5 projected
  circle A1 centre (0, 29.5) radius 3
  point P0 (0, 0)
  dimension "d36" = 6
properties part number "servo_side_plate2"
